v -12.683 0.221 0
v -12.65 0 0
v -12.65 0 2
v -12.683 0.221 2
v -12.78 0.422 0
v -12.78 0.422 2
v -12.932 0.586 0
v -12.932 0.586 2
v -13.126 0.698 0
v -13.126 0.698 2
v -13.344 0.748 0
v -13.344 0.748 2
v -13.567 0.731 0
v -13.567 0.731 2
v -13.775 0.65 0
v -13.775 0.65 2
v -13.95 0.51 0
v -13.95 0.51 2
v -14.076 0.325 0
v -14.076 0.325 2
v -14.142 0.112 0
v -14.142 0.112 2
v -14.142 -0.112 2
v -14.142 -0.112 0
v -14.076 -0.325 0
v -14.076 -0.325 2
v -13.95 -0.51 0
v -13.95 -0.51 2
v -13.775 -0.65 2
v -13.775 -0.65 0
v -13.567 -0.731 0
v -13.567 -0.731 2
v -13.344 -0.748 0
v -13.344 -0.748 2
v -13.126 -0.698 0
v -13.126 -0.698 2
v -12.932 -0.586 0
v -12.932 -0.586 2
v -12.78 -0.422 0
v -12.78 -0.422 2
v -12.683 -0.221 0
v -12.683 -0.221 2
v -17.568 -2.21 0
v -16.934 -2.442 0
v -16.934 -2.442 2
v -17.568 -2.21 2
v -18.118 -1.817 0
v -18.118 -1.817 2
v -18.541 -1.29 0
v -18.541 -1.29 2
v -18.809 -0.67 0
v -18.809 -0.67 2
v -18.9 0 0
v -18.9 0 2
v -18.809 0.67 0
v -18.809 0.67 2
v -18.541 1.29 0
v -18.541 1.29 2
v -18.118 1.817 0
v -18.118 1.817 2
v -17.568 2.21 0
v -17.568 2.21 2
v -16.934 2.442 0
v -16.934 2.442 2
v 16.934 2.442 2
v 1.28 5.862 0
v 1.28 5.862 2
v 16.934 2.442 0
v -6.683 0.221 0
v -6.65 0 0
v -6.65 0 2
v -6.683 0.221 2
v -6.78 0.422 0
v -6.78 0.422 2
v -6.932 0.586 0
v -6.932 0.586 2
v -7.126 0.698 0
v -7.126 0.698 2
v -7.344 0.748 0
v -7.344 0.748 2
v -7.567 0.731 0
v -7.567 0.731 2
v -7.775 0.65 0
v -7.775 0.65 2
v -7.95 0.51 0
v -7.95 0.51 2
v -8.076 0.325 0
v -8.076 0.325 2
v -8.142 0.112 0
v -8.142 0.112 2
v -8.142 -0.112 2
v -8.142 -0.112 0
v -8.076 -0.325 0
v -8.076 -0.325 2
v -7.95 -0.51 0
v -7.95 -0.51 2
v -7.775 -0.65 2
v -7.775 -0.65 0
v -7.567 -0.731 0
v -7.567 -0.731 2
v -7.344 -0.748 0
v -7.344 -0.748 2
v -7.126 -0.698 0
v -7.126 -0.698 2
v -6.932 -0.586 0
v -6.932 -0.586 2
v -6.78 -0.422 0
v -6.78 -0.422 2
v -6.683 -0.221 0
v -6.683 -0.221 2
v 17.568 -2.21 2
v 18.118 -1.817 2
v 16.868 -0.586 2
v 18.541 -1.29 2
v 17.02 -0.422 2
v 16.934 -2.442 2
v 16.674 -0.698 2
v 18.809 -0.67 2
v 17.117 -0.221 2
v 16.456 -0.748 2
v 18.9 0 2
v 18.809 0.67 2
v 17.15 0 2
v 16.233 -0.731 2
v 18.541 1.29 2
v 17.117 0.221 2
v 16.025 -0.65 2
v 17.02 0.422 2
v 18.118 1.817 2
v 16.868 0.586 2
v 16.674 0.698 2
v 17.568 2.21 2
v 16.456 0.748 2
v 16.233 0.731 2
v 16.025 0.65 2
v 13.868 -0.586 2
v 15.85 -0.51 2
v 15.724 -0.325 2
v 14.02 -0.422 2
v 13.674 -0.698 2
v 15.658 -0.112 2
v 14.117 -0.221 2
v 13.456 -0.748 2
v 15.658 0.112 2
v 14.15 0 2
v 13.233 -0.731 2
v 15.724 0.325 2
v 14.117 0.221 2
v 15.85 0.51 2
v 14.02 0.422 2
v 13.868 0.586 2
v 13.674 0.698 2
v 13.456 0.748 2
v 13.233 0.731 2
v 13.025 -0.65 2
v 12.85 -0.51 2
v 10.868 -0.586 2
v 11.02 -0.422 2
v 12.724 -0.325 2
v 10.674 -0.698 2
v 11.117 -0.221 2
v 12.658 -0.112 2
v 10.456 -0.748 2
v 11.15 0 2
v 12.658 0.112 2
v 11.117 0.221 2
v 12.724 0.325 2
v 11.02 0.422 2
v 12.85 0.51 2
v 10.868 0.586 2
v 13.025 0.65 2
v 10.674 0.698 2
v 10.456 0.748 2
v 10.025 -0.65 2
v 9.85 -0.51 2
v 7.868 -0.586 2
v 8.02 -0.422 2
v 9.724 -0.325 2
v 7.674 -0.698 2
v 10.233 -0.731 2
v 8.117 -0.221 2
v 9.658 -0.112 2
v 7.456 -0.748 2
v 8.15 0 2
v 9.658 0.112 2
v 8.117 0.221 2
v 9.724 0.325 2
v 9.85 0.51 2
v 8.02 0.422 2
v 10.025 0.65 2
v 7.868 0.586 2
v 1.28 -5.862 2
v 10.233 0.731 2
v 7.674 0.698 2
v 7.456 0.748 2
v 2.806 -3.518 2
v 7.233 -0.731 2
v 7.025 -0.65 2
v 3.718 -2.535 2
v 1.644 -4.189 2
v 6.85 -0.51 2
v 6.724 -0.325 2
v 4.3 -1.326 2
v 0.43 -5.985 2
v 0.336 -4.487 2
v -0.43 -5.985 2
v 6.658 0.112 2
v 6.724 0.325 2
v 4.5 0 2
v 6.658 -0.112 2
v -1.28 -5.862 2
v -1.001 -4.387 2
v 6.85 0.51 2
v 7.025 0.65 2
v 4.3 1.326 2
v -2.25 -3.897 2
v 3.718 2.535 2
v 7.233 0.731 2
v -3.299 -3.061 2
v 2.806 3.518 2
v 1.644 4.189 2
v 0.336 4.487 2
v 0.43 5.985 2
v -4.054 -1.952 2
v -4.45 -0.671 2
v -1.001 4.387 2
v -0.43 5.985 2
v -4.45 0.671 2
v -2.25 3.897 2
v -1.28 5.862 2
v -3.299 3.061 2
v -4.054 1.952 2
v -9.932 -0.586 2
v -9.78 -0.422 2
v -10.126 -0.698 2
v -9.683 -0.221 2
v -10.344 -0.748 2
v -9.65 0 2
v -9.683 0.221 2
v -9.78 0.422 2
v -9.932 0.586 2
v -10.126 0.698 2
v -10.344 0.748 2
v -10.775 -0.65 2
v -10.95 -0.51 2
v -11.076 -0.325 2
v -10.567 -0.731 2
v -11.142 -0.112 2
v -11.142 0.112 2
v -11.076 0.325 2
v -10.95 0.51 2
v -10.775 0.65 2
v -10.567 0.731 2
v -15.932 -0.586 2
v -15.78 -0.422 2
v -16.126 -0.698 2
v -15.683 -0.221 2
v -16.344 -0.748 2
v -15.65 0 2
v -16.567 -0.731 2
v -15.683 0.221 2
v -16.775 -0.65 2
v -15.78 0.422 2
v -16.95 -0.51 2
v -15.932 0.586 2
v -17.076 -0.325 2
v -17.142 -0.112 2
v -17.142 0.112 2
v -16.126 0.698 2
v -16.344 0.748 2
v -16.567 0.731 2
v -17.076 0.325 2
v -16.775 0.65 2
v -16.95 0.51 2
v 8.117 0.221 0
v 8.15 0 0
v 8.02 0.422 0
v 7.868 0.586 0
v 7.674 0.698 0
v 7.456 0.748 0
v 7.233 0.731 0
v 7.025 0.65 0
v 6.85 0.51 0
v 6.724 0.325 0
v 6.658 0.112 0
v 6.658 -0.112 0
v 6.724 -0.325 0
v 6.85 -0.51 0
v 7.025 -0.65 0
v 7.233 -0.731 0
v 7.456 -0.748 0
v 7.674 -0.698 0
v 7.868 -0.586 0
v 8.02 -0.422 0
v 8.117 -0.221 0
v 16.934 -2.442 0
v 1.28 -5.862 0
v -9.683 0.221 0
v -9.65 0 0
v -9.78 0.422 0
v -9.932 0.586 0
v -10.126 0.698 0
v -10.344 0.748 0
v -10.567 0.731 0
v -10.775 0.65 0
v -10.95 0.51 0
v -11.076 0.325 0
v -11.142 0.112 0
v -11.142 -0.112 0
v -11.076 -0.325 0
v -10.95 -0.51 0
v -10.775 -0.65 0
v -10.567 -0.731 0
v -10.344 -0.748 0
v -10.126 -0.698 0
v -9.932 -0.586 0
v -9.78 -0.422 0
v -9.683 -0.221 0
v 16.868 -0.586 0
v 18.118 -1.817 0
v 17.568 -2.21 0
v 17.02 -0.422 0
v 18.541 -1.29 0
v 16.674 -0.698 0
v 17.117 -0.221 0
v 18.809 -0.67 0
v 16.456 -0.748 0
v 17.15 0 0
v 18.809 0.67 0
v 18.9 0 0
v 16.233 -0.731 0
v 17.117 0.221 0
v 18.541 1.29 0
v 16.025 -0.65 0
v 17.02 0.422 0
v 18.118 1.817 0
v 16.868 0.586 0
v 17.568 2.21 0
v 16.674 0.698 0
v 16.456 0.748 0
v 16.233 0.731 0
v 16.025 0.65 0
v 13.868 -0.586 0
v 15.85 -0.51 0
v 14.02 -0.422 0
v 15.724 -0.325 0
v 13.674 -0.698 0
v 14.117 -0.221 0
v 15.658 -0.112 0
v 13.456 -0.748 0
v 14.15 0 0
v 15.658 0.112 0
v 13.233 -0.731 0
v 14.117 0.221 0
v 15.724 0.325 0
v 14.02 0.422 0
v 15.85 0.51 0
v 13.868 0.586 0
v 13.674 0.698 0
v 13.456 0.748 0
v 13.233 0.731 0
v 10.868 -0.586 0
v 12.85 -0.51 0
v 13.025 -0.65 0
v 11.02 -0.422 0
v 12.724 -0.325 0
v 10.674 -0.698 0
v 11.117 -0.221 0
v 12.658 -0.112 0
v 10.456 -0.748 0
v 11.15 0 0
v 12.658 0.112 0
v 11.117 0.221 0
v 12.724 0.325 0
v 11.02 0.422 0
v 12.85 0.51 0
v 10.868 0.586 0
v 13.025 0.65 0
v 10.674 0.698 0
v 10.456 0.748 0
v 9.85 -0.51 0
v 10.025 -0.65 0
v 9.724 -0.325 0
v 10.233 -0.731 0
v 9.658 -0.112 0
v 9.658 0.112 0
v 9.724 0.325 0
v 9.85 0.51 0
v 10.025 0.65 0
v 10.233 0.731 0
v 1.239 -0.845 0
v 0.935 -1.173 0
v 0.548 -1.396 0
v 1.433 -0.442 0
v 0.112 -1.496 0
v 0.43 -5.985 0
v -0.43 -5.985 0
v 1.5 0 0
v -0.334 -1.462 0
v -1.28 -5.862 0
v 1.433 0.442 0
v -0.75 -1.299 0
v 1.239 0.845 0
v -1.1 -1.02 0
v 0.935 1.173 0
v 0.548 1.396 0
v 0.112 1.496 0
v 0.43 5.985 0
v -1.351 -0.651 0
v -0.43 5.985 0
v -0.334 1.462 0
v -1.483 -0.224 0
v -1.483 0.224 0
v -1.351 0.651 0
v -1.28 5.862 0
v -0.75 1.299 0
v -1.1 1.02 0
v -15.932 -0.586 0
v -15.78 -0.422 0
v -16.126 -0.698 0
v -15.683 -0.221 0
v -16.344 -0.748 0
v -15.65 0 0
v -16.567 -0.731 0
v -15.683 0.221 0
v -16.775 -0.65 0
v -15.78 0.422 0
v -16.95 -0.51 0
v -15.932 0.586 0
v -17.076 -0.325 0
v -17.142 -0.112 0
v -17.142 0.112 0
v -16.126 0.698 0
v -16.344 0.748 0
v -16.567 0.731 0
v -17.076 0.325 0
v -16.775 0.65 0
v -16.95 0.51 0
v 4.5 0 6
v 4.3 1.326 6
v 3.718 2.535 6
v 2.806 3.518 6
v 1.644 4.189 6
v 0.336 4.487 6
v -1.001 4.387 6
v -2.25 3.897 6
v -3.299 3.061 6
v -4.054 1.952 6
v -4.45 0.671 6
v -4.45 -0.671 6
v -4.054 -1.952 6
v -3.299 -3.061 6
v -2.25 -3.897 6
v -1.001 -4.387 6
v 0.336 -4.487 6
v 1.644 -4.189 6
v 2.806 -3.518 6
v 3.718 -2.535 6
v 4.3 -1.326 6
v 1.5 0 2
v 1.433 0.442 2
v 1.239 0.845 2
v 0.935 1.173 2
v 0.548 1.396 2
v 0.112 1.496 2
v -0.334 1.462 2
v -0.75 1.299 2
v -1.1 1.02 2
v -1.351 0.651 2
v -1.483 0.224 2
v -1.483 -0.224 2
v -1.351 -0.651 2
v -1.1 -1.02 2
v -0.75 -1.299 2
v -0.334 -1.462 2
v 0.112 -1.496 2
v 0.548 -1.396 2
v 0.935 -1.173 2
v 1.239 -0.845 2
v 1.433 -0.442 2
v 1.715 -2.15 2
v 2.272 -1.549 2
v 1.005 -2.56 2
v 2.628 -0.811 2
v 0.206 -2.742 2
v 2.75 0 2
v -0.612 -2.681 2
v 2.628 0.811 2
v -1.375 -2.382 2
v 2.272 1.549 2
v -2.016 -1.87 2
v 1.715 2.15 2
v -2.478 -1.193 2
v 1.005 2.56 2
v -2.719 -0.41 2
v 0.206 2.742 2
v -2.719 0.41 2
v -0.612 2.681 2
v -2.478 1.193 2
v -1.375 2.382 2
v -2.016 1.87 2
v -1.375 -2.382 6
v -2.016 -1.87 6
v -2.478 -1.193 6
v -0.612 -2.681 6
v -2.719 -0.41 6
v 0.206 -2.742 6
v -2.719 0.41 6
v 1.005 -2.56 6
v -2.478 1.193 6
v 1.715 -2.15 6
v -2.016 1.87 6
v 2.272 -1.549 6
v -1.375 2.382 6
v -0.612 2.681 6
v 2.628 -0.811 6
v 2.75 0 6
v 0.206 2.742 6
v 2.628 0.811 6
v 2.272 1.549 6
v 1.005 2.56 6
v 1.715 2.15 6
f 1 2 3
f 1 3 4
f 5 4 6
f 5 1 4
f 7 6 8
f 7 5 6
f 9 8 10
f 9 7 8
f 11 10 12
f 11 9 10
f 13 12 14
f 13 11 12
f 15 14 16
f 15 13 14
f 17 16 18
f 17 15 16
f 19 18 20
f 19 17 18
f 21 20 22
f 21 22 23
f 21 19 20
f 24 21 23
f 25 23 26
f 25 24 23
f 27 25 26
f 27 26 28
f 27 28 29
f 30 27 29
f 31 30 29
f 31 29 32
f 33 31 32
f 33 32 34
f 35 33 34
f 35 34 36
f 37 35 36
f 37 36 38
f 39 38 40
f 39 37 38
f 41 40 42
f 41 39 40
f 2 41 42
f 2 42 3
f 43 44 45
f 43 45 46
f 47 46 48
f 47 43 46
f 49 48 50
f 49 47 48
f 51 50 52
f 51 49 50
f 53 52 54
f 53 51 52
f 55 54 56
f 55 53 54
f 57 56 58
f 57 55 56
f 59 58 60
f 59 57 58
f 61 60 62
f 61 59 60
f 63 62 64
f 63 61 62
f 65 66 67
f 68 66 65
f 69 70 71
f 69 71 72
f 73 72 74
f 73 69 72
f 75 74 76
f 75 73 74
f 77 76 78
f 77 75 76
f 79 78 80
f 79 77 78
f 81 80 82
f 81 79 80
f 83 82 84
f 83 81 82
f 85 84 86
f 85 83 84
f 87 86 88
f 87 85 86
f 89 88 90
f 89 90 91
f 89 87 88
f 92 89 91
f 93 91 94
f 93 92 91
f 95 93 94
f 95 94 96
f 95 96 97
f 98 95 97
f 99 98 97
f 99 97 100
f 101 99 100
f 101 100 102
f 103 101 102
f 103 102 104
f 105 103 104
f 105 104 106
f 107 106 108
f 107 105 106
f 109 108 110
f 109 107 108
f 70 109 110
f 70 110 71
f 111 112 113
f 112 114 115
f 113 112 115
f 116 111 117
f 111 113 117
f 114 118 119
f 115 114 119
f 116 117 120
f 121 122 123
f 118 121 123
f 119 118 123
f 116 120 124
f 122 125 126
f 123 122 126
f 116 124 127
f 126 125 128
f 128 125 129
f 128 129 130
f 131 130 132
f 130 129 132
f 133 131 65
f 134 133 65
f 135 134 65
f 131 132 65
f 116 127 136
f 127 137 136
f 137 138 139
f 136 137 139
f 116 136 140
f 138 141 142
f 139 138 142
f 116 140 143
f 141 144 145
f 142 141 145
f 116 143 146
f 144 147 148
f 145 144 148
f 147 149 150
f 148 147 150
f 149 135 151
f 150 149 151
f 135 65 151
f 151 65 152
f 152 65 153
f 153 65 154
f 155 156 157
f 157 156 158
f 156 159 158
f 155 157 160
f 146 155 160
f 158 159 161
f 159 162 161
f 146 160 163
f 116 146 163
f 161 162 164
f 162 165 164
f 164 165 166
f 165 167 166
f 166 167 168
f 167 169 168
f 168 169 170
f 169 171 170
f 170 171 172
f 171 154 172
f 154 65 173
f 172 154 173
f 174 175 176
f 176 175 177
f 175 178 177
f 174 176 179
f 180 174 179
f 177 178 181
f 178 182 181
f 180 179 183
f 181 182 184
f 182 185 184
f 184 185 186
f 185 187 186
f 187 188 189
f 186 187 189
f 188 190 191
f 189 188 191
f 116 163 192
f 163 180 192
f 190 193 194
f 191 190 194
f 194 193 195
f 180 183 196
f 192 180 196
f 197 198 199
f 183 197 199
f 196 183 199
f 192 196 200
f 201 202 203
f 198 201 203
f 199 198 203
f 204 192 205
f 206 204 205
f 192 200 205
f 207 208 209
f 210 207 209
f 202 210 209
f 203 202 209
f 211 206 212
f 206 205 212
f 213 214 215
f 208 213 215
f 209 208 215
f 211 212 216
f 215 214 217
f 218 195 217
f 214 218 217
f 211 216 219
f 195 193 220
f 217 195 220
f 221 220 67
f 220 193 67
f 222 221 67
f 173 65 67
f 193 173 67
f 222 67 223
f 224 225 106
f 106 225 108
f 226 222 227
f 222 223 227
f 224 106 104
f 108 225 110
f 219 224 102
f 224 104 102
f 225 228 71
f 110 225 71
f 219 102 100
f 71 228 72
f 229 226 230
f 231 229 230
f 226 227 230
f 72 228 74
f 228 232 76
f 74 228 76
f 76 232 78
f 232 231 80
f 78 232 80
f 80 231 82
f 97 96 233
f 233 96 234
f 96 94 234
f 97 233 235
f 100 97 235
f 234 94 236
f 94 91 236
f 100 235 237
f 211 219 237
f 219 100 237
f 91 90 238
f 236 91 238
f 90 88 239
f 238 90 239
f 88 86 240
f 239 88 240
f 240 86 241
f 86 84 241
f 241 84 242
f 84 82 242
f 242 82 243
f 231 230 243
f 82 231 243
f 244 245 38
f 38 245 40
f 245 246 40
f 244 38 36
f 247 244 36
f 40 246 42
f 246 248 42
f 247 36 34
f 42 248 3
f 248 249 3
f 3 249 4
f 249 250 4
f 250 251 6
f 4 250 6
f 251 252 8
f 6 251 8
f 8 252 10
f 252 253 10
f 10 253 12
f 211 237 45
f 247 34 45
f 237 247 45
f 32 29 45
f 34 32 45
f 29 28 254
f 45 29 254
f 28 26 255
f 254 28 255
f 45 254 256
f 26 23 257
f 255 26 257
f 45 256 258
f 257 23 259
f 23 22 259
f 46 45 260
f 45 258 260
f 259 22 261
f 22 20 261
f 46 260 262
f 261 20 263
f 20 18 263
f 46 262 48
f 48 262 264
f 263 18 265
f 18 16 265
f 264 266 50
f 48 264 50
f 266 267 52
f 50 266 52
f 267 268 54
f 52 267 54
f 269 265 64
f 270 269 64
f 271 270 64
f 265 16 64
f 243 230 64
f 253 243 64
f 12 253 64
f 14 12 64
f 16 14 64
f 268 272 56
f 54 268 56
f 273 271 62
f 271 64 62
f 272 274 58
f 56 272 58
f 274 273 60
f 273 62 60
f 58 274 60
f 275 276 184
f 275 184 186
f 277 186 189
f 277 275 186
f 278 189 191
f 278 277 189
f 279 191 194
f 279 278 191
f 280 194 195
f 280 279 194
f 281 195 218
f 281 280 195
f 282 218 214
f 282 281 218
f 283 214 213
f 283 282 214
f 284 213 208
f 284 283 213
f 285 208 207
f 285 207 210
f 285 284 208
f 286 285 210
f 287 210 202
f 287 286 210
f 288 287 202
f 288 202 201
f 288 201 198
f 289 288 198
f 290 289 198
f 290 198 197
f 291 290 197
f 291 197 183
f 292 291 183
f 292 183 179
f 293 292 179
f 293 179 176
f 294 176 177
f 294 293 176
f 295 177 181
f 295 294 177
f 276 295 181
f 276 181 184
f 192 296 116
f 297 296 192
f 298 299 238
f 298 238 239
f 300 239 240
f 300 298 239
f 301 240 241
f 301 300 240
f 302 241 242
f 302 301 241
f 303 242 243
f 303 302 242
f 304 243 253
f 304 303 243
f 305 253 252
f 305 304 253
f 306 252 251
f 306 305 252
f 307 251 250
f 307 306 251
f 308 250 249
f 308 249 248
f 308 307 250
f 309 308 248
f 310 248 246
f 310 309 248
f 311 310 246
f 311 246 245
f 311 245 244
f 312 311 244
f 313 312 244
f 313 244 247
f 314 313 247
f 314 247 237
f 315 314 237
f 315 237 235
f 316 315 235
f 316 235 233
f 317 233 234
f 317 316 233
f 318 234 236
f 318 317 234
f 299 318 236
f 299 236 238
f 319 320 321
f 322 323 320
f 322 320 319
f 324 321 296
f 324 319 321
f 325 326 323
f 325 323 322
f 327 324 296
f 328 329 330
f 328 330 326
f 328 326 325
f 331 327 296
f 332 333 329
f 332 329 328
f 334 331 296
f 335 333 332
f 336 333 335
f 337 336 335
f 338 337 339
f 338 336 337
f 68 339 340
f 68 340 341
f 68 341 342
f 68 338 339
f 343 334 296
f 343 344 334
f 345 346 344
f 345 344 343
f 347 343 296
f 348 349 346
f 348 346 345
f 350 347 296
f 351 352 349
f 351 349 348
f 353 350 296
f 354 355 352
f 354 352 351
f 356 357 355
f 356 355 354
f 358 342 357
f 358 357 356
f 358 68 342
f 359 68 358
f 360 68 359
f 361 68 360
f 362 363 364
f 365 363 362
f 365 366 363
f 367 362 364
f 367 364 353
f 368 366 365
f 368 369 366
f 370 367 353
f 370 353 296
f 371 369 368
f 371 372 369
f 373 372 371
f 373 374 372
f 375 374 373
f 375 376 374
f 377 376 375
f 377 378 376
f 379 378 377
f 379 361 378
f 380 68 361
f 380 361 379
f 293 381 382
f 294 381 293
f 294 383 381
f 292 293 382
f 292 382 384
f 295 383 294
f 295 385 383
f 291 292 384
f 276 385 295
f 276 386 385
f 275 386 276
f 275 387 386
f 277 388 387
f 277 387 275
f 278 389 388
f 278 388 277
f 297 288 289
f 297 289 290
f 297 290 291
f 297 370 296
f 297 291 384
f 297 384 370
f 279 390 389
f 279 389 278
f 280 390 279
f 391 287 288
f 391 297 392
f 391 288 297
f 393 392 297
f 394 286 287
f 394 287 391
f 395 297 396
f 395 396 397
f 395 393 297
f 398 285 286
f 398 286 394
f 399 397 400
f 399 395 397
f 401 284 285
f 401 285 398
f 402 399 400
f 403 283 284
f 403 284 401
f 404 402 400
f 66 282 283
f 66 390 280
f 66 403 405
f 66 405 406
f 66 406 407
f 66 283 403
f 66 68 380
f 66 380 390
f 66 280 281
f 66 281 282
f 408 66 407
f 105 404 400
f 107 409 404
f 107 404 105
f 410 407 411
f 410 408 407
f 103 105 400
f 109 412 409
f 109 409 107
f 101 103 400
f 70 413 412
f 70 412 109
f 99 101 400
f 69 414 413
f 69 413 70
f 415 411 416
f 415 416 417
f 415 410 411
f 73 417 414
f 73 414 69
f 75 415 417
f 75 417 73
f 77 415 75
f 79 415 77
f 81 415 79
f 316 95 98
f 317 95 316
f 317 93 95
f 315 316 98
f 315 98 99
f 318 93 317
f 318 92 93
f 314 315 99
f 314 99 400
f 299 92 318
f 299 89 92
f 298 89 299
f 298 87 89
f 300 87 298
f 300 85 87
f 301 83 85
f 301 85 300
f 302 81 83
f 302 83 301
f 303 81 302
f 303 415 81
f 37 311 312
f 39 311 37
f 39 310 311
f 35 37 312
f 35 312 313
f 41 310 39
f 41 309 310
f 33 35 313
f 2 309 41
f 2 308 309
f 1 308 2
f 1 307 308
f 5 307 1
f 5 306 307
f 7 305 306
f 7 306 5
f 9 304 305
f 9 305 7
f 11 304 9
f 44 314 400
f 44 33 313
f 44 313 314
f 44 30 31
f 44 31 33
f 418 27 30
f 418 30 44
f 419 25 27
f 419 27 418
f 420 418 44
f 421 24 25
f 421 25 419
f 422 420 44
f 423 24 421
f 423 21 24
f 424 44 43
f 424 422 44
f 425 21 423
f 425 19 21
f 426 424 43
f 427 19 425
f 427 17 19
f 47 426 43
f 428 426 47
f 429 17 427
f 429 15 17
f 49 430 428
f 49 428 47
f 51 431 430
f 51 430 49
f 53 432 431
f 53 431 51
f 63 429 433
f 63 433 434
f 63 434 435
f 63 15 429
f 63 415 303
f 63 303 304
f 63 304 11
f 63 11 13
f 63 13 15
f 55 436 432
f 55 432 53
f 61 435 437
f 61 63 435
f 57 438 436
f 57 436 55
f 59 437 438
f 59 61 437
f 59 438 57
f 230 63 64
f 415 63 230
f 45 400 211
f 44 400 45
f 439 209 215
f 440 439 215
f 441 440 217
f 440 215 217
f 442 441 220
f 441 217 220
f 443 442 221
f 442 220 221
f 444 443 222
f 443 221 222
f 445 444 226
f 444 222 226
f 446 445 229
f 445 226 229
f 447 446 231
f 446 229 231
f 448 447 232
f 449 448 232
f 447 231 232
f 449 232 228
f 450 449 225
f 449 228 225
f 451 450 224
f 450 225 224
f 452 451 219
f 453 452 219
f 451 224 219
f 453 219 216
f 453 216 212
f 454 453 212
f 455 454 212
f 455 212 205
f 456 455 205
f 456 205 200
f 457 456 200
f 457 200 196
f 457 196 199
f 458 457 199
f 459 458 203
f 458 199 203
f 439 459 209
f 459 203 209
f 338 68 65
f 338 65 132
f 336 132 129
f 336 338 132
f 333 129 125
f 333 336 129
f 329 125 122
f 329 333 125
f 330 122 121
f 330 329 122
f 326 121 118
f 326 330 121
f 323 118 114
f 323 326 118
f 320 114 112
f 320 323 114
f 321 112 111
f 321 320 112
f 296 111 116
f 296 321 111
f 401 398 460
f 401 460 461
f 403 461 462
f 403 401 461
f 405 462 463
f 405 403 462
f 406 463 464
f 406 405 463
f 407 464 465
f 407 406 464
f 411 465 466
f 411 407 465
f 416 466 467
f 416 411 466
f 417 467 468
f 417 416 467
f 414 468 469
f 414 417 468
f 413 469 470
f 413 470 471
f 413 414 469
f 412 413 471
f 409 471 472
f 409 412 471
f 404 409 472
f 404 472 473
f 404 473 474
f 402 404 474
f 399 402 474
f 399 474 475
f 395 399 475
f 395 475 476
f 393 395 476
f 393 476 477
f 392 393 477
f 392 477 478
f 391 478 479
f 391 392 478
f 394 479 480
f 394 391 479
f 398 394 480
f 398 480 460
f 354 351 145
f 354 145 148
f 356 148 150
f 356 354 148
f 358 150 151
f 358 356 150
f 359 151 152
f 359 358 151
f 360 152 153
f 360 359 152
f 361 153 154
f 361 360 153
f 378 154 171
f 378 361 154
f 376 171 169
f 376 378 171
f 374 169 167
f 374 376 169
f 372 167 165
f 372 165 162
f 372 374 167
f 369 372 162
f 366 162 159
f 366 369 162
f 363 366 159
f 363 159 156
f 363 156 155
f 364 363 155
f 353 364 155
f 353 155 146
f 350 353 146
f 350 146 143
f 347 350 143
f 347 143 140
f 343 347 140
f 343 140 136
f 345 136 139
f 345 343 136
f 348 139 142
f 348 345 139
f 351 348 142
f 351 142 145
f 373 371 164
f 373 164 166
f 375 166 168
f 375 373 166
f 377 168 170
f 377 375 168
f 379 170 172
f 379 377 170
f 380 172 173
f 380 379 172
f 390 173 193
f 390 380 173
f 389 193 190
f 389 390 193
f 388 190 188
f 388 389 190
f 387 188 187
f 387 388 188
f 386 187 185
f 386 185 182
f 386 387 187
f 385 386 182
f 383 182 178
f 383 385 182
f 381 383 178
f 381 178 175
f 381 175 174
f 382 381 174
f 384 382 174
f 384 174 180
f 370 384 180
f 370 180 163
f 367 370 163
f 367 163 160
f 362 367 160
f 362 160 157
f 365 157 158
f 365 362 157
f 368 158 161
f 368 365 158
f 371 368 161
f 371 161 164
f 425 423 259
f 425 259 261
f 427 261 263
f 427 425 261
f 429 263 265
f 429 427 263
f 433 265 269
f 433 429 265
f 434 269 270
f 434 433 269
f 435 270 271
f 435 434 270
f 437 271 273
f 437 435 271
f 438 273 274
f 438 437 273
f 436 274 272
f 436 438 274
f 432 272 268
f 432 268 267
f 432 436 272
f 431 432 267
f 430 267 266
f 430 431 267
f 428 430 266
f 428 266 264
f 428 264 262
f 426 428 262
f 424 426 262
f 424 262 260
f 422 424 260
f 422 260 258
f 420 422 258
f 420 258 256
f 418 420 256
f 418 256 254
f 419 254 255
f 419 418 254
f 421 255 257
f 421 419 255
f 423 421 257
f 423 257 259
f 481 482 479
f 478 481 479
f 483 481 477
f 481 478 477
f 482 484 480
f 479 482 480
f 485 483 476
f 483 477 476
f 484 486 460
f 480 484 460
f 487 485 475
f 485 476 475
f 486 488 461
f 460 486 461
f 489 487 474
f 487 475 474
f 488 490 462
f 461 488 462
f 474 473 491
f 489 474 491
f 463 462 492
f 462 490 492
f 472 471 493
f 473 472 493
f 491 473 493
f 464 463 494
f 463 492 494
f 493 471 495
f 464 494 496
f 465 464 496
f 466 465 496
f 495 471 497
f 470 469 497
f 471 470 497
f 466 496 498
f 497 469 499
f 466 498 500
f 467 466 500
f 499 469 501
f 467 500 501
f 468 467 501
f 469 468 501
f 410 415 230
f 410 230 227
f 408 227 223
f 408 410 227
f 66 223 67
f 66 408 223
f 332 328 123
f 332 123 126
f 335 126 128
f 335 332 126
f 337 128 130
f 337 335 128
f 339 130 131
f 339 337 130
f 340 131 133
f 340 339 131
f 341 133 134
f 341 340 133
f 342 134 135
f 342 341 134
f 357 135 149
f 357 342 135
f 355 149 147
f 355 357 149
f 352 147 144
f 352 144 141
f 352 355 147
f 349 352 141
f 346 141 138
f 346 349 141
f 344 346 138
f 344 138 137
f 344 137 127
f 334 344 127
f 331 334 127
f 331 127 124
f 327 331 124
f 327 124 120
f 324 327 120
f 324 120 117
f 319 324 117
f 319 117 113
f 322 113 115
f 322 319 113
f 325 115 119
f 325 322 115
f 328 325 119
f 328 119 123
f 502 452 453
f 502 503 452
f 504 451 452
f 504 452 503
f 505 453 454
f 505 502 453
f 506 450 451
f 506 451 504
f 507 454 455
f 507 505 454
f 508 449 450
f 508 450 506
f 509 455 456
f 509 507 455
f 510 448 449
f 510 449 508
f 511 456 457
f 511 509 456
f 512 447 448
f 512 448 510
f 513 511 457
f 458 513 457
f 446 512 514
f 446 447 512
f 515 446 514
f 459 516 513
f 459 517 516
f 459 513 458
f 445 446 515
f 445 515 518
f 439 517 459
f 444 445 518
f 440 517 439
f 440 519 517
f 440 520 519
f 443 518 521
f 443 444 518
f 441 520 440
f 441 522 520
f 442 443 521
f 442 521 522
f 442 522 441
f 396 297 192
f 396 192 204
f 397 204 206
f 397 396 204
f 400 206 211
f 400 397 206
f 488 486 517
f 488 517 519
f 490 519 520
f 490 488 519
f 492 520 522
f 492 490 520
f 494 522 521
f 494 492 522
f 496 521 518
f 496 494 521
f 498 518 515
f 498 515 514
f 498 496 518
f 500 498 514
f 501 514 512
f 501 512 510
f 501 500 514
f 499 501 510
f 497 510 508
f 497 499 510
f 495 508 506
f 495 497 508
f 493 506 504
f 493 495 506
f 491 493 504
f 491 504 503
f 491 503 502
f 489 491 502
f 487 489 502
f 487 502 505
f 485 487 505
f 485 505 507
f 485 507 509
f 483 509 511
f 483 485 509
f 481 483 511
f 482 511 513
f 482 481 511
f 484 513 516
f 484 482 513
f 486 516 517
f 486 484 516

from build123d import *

# Parameters (mm, degrees)
IZIM1_R                     = 1.5
IZIM1_R_2                   = 0.75
Y_KSEKLIK_EKSTR_ZYON1_DEPTH = 2
IZIM2_R                     = 4.5
IZIM2_R_2                   = 2.75
Y_KSEKLIK_EKSTR_ZYON2_DEPTH = 4


with BuildPart() as part:
    # Çizim1 → Yükseklik-Ekstrüzyon1 (new body)
    with BuildSketch(Plane.XY):
        with BuildLine():
            Line((-16.933536585, 2.442404289), (-1.280487805, 5.861770294))
            ThreePointArc((-1.280487805, 5.861770294), (0, 6), (1.280487805, 5.861770294))
            Line((1.280487805, 5.861770294), (16.933536585, 2.442404289))
            ThreePointArc((16.933536585, 2.442404289), (18.9, 0), (16.933536585, -2.442404289))
            Line((16.933536585, -2.442404289), (1.280487805, -5.861770294))
            ThreePointArc((1.280487805, -5.861770294), (0, -6), (-1.280487805, -5.861770294))
            Line((-1.280487805, -5.861770294), (-16.933536585, -2.442404289))
            ThreePointArc((-16.933536585, -2.442404289), (-18.9, 0), (-16.933536585, 2.442404289))
        make_face()
        Circle(IZIM1_R, mode=Mode.SUBTRACT)
        with Locations((7.4, 0)):
            Circle(IZIM1_R_2, mode=Mode.SUBTRACT)
        with Locations((10.4, 0)):
            Circle(IZIM1_R_2, mode=Mode.SUBTRACT)
        with Locations((13.4, 0)):
            Circle(IZIM1_R_2, mode=Mode.SUBTRACT)
        with Locations((16.4, 0)):
            Circle(IZIM1_R_2, mode=Mode.SUBTRACT)
        with Locations((-7.4, 0)):
            Circle(IZIM1_R_2, mode=Mode.SUBTRACT)
        with Locations((-10.4, 0)):
            Circle(IZIM1_R_2, mode=Mode.SUBTRACT)
        with Locations((-13.4, 0)):
            Circle(IZIM1_R_2, mode=Mode.SUBTRACT)
        with Locations((-16.4, 0)):
            Circle(IZIM1_R_2, mode=Mode.SUBTRACT)
    extrude(amount=Y_KSEKLIK_EKSTR_ZYON1_DEPTH)

    # Çizim2 → Yükseklik-Ekstrüzyon2 (add)
    with BuildSketch(Plane.XY.offset(2)):
        Circle(IZIM2_R)
        Circle(IZIM2_R_2, mode=Mode.SUBTRACT)
    extrude(amount=Y_KSEKLIK_EKSTR_ZYON2_DEPTH)


solid = part.part
